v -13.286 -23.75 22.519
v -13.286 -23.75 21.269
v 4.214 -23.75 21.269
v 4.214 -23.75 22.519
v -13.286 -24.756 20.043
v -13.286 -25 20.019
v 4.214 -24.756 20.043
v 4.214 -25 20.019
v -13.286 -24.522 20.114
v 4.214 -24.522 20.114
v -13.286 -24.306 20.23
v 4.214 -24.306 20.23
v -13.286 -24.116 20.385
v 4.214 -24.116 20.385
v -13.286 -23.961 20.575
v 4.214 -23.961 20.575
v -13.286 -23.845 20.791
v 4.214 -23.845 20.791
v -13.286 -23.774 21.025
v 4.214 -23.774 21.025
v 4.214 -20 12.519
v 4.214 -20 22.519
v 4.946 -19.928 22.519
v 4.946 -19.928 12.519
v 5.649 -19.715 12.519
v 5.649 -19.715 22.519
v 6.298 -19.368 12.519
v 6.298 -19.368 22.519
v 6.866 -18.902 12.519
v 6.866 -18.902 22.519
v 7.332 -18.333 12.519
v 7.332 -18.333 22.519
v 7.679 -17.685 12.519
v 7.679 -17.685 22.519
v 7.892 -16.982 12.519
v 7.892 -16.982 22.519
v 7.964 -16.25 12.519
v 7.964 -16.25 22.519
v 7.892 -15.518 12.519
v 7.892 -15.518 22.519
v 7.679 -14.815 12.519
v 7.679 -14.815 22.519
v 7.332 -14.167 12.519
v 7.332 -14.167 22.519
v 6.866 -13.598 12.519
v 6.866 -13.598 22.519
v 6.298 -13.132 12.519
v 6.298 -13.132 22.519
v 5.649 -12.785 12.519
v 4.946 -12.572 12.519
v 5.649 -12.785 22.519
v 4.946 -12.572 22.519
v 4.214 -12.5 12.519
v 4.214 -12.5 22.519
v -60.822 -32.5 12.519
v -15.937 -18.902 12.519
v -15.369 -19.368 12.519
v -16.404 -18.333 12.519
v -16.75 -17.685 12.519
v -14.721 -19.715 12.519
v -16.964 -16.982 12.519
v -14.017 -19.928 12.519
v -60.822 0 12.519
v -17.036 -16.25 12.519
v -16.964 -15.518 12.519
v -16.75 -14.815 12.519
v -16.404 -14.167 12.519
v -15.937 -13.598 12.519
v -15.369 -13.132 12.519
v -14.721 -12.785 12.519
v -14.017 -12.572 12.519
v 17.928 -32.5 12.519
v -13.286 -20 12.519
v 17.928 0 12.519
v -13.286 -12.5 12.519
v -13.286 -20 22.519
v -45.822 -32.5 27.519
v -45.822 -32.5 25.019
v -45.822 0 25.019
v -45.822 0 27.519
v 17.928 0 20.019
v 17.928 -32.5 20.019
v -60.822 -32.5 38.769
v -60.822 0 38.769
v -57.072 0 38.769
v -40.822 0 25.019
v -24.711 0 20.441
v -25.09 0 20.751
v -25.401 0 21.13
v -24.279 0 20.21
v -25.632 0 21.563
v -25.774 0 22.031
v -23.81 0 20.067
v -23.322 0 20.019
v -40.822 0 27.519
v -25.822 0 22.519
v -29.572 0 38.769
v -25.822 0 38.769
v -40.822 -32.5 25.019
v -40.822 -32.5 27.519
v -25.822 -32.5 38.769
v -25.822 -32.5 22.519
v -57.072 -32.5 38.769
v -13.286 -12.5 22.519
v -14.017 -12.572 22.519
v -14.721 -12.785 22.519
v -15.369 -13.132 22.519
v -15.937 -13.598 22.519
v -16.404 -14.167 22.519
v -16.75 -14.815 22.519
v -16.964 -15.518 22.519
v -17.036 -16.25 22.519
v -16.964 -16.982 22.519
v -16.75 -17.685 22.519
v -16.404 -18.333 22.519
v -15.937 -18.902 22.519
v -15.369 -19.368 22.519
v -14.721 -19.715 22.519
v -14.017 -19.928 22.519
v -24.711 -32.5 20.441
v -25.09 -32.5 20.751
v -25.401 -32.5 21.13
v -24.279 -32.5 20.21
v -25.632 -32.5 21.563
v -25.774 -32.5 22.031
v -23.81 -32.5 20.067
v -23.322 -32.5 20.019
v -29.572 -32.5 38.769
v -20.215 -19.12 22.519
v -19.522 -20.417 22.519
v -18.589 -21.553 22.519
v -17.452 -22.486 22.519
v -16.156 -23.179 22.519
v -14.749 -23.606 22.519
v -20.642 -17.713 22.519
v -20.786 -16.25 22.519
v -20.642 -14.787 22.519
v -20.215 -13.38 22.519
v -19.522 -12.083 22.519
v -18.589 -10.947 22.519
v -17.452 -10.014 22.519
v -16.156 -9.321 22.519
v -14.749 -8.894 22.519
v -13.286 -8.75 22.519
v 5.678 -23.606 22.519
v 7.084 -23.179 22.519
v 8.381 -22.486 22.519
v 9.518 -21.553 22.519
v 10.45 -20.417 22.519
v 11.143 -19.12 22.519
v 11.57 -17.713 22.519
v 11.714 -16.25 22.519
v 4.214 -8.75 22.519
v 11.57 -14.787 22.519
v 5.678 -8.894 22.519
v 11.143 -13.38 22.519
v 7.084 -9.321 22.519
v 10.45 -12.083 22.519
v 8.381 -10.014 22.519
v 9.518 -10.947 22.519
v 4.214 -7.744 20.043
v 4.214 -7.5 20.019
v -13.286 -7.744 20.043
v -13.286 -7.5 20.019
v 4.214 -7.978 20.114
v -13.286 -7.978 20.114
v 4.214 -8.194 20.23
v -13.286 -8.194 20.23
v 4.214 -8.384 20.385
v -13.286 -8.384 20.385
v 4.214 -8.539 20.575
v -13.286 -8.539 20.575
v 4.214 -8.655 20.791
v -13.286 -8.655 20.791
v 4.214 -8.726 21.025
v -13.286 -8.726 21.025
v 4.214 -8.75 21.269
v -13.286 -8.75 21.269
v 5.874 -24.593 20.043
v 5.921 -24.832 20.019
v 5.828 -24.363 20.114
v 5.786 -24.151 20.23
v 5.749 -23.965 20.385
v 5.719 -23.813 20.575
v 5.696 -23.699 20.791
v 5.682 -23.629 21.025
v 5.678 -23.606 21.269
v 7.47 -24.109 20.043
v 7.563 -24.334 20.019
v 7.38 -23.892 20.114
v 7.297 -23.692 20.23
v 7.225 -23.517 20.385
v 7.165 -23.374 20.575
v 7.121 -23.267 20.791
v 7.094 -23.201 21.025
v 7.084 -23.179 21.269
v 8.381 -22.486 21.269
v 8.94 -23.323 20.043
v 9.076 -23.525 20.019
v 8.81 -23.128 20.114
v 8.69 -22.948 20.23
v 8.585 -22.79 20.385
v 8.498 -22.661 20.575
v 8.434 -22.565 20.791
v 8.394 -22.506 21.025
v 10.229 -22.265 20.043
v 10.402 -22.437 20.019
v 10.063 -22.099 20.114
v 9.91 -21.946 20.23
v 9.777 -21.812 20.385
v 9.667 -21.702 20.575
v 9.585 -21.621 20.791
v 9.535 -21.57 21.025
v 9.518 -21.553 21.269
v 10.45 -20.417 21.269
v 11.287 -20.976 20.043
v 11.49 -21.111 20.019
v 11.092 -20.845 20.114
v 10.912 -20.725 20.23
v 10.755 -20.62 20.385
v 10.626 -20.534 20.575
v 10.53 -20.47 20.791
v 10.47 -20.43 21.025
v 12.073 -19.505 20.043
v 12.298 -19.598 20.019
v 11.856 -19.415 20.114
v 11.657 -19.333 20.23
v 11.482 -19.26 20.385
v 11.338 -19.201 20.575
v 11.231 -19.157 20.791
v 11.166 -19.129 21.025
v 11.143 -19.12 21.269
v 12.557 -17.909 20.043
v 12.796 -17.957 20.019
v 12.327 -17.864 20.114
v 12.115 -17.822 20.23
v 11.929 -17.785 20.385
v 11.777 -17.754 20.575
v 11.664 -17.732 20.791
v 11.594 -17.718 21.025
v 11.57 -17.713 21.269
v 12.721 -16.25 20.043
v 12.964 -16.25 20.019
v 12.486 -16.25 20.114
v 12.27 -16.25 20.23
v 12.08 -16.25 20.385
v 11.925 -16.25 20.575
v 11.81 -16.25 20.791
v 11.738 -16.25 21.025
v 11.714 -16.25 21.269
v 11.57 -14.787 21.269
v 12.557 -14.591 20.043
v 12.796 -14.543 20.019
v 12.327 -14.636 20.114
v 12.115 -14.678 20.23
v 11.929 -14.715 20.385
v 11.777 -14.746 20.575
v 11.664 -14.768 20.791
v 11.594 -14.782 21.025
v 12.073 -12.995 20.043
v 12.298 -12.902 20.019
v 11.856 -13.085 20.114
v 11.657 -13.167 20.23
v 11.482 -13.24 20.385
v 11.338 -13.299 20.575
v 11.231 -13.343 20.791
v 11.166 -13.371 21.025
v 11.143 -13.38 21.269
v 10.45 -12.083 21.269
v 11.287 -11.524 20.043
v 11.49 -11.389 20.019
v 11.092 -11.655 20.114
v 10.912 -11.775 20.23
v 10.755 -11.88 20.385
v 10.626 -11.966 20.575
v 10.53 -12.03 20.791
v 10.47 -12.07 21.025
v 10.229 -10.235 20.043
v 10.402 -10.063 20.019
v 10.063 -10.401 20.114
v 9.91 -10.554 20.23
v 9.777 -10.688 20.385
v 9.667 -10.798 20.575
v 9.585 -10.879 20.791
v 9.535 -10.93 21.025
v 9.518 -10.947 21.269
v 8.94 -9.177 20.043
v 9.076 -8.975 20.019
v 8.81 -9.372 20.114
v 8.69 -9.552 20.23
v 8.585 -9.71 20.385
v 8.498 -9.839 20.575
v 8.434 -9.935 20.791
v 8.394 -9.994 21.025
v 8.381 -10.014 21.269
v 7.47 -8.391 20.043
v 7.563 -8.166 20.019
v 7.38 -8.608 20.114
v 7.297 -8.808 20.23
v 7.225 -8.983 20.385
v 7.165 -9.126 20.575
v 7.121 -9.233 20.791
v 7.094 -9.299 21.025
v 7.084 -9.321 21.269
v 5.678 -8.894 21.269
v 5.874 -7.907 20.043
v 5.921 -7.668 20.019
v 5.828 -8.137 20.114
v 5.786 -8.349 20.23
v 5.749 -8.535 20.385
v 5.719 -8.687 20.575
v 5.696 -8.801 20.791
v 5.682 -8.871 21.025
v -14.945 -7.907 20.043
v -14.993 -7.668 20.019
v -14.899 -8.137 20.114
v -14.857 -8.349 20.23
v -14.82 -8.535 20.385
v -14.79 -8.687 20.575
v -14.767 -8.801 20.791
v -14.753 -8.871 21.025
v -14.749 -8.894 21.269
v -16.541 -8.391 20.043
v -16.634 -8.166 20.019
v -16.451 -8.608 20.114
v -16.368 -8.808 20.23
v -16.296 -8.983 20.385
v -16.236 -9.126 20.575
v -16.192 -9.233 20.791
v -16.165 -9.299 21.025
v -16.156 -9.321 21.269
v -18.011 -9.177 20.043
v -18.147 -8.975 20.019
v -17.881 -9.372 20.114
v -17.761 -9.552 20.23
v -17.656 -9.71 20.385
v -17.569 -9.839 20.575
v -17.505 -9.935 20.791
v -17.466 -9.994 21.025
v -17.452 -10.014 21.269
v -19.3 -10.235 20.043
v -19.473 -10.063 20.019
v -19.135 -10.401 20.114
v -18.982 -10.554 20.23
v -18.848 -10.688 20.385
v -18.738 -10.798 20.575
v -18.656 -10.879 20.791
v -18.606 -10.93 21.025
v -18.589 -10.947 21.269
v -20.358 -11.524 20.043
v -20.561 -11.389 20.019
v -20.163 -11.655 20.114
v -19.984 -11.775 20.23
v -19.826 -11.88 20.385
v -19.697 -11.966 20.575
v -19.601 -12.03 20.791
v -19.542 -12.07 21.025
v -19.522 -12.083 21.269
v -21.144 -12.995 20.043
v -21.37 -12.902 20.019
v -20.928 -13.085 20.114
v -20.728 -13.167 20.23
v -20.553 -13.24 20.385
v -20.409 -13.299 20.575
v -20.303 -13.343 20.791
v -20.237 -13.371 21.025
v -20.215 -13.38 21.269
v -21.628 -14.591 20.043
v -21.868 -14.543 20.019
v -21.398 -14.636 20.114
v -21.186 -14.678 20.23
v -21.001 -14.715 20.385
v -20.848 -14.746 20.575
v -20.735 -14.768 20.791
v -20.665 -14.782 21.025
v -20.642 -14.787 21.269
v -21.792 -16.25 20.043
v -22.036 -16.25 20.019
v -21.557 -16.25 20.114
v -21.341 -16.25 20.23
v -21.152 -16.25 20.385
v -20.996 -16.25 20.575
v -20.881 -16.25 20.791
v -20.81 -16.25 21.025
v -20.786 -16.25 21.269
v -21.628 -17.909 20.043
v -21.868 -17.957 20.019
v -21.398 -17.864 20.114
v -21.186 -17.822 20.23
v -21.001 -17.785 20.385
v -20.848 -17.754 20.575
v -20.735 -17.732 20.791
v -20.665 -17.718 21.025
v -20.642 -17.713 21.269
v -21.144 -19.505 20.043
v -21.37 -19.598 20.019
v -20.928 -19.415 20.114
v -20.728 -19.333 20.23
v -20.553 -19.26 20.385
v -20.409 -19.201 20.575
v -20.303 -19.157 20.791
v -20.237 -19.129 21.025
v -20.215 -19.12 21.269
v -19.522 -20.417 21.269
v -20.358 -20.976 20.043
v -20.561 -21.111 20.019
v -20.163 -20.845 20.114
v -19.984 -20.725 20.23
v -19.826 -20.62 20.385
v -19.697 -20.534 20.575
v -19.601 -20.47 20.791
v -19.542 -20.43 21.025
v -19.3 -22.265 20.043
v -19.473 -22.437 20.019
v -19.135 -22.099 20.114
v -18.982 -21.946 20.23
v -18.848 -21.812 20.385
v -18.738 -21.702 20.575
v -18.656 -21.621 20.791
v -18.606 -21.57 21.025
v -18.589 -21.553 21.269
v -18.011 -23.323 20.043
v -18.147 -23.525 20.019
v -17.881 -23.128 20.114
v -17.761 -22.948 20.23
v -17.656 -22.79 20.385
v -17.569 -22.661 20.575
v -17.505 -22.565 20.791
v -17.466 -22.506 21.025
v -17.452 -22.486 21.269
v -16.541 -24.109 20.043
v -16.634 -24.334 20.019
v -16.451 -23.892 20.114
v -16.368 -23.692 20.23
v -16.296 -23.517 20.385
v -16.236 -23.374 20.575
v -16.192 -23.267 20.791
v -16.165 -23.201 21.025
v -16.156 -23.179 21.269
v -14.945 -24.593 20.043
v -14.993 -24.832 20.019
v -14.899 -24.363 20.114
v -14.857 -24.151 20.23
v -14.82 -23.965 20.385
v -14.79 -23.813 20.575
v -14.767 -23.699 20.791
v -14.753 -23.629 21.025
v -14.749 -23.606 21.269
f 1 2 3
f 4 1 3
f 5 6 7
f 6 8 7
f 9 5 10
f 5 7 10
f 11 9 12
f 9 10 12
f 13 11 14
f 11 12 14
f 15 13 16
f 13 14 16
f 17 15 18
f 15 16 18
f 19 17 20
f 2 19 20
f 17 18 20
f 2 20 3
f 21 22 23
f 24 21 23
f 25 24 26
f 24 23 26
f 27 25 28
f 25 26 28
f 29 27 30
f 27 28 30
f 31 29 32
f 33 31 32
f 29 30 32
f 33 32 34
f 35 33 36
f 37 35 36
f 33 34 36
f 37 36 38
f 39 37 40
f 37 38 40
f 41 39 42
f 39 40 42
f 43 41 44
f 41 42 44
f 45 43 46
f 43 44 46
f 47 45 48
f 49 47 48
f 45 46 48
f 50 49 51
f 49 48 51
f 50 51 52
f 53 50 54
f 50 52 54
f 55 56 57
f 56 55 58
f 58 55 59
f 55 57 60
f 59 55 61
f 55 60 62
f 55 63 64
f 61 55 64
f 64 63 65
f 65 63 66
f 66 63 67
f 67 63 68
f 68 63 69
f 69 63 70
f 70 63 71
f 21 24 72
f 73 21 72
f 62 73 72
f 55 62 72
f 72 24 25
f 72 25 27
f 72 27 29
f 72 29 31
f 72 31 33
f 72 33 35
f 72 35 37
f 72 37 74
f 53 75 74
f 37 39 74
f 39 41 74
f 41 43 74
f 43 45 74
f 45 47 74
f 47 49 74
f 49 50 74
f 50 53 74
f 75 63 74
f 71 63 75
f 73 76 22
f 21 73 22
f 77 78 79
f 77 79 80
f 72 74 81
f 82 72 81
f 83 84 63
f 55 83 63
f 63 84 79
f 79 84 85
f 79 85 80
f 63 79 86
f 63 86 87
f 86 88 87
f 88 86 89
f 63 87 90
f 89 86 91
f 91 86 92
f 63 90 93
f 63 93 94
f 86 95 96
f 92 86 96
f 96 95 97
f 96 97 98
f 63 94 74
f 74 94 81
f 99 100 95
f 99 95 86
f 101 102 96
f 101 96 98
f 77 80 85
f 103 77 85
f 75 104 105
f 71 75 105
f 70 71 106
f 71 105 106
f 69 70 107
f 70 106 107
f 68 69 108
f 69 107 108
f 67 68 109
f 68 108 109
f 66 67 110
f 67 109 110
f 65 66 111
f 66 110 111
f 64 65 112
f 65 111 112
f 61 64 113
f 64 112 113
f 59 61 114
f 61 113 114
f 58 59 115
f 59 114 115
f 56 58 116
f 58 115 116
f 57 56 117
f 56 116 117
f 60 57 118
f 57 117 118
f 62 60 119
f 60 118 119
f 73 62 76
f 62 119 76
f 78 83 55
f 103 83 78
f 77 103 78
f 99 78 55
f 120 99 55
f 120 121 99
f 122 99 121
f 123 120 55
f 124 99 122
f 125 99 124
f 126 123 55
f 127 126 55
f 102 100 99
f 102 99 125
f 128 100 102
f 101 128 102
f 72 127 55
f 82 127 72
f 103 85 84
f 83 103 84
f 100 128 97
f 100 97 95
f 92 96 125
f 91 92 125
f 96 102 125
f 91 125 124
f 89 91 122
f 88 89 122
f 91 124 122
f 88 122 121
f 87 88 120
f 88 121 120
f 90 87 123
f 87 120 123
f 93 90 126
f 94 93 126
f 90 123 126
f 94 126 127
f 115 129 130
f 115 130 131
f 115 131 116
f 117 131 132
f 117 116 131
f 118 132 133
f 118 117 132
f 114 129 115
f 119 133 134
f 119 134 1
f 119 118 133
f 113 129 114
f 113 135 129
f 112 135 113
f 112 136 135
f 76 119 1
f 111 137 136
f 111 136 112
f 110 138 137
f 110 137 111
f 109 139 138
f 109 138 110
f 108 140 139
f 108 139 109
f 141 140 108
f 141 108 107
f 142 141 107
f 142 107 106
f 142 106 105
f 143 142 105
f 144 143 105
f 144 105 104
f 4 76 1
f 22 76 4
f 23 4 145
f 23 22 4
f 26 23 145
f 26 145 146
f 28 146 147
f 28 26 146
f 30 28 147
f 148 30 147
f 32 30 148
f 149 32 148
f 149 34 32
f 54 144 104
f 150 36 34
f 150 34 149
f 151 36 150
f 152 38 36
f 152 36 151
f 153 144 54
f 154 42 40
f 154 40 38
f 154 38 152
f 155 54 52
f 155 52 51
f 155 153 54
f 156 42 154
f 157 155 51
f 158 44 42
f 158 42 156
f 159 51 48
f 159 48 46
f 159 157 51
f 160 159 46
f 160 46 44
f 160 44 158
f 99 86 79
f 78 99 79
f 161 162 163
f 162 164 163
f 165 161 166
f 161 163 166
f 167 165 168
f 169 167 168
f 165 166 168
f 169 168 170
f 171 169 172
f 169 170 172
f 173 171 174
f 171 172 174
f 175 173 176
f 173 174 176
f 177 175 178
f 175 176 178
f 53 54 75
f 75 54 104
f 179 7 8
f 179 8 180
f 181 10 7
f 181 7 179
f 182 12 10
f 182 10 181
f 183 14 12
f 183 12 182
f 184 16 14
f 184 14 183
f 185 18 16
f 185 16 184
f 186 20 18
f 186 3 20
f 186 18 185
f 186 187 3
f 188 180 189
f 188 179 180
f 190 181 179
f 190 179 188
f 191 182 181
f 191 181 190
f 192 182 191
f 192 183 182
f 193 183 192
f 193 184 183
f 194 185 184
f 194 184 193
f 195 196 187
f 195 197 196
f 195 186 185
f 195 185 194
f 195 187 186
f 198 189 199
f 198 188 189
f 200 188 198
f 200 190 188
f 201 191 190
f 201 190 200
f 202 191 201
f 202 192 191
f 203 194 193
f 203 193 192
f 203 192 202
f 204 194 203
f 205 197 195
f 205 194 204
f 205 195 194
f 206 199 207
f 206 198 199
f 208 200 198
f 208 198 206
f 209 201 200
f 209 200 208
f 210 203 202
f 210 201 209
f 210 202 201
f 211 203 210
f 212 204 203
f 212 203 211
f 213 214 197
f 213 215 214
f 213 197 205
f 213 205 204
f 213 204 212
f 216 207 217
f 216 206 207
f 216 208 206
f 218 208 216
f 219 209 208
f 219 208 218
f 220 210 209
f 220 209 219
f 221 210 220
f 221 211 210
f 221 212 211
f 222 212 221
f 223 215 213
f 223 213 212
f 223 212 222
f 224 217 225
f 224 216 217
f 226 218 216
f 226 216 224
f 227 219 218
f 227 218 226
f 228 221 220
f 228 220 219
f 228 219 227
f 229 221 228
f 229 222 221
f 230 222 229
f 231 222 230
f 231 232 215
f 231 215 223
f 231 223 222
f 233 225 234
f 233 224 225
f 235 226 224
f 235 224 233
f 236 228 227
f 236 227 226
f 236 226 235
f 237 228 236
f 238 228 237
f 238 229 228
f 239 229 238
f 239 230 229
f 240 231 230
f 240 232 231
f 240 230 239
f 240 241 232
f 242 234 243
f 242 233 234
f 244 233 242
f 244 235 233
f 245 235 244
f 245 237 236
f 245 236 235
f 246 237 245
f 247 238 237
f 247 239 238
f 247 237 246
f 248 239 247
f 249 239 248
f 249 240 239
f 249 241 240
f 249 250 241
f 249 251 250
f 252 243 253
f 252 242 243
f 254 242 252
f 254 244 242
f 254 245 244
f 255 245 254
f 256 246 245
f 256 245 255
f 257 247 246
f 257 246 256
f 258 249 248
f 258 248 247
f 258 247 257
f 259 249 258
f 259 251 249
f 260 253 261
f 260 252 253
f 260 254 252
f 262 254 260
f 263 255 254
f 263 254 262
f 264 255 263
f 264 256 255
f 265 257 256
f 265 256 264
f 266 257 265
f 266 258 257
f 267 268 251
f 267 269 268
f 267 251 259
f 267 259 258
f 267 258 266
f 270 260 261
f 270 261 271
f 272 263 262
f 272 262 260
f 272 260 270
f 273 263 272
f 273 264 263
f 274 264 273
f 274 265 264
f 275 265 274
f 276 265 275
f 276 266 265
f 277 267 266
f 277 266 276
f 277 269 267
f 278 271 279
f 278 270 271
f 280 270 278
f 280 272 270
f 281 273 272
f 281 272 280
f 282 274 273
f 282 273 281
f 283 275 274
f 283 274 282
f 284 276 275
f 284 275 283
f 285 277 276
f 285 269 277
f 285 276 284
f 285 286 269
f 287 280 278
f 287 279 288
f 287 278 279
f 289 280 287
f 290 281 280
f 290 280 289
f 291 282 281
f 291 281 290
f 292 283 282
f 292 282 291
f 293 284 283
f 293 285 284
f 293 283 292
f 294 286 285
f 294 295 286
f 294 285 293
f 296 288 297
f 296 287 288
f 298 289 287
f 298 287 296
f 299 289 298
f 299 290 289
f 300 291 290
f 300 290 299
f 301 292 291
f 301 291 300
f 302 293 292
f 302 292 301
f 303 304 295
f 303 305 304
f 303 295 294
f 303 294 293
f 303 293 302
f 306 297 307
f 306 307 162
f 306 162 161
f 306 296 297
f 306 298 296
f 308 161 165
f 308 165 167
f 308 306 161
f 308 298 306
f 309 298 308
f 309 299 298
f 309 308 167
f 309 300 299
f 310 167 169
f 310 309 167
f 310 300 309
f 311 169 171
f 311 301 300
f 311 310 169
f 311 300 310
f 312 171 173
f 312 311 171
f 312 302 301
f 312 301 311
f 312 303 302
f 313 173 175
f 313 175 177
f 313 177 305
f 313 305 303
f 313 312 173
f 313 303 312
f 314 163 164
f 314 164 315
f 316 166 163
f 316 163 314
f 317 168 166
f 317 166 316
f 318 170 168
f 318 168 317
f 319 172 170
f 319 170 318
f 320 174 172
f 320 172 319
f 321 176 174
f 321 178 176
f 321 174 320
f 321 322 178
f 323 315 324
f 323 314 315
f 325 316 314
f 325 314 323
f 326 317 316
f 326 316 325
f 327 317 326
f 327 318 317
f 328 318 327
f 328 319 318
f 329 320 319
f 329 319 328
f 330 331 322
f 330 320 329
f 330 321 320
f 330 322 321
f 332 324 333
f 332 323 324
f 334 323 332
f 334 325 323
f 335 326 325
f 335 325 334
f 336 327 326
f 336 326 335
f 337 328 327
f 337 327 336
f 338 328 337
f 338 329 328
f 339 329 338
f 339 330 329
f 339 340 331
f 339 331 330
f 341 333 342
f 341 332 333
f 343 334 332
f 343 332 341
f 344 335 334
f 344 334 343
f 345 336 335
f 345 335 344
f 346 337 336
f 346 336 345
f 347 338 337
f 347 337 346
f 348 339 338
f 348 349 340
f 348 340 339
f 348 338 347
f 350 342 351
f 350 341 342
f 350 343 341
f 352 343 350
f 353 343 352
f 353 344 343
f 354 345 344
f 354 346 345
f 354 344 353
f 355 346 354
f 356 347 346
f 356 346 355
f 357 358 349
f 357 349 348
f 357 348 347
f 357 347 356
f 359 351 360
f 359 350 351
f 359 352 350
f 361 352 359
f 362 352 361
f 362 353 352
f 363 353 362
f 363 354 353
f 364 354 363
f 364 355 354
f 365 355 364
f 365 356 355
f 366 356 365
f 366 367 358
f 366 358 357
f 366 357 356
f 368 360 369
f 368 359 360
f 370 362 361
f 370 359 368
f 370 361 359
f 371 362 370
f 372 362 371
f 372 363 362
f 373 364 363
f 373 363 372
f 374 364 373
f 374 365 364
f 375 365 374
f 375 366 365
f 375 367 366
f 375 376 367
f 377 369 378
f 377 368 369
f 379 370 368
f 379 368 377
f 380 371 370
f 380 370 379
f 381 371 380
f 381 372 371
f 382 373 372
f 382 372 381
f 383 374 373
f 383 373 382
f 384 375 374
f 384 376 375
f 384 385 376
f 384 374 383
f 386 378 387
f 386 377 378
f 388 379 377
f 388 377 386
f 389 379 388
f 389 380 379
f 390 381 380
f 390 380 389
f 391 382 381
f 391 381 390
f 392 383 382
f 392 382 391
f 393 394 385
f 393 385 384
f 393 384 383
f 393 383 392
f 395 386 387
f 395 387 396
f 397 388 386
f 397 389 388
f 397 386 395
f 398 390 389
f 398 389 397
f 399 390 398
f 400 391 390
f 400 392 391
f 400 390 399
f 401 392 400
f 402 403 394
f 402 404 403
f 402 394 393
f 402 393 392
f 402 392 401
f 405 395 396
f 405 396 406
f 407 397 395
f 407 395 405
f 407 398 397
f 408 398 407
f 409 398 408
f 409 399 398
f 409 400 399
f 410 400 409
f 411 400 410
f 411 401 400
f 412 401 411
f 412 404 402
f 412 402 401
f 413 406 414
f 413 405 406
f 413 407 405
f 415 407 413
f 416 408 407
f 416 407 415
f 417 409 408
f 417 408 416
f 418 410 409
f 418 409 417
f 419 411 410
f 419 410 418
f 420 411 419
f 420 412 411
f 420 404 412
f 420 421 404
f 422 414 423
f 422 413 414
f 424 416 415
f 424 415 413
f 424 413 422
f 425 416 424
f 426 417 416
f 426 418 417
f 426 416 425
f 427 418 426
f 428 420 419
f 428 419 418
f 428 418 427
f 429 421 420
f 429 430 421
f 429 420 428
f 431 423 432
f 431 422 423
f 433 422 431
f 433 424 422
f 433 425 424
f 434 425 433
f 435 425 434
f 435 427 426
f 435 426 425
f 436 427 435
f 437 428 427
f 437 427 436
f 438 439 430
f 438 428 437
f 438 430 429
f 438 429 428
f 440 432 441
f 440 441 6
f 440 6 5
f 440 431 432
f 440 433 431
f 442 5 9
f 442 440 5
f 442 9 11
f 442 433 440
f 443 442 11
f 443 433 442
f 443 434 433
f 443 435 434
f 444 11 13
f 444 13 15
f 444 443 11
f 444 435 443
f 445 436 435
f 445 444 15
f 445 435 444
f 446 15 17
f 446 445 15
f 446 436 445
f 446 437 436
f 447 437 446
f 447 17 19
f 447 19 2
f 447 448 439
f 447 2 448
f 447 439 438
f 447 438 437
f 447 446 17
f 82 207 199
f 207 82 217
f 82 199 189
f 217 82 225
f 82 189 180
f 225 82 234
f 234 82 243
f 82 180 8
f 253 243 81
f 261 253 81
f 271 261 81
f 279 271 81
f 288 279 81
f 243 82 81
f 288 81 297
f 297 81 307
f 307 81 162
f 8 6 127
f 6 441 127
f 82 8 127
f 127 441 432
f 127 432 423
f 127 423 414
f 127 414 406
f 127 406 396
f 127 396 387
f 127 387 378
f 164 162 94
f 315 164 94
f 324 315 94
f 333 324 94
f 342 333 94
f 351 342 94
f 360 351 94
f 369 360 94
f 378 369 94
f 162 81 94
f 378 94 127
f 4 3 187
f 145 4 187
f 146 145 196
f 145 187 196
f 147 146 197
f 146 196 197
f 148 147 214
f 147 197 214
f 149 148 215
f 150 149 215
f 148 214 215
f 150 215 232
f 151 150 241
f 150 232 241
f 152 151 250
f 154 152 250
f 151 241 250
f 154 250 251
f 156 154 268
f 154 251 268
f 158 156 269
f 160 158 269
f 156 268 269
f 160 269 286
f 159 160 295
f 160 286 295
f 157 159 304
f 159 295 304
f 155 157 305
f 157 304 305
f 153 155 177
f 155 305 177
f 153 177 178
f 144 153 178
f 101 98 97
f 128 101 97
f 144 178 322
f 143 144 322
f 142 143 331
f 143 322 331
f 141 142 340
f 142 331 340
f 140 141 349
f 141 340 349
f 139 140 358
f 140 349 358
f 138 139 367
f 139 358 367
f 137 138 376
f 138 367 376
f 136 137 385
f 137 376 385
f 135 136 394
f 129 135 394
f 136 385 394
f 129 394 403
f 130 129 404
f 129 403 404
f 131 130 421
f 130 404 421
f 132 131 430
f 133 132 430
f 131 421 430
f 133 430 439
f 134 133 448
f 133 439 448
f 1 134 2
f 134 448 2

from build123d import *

# Parameters (mm, degrees)
F1_DEPTH = 32.5
F3_DEPTH = 2.5
F4_DEPTH = 25
F5_R     = 2.5
F6_R     = 1.25


with BuildPart() as f1:
    # F0 (on Front) → F1 (new body)
    with BuildSketch(Plane.XZ):
        Polygon((-57.07207, 38.769209), (-60.82207, 38.769209), (-60.82207, 12.519209), (17.92793, 12.519209), (17.92793, 20.019209), (-25.82207, 20.019209), (-25.82207, 38.769209), (-29.57207, 38.769209), (-40.82207, 27.519209), (-40.82207, 25.019209), (-45.82207, 25.019209), (-45.82207, 27.519209), align=None)
    extrude(amount=F1_DEPTH)

    # F2 (on face) → F3 (join)
    with BuildSketch(Plane.XY.offset(20.019209)):
        with BuildLine():
            Line((4.214367, -8.75), (-13.285633, -8.75))
            ThreePointArc((-13.285633, -8.75), (-20.785633, -16.25), (-13.285633, -23.75))
            Line((-13.285633, -23.75), (4.214367, -23.75))
            ThreePointArc((4.214367, -23.75), (11.714367, -16.25), (4.214367, -8.75))
        make_face()
        with BuildLine():
            ThreePointArc((-13.285633, -20), (-17.035633, -16.25), (-13.285633, -12.5))
            Line((-13.285633, -12.5), (4.214367, -12.5))
            ThreePointArc((4.214367, -12.5), (7.964367, -16.25), (4.214367, -20))
            Line((4.214367, -20), (-13.285633, -20))
        make_face(mode=Mode.SUBTRACT)
    extrude(amount=F3_DEPTH)

    # F3_face (on face) → F4 (cut)
    with BuildSketch(Plane(origin=(-4.535633, -16.25, 20.019209), x_dir=(1, 0, 0), z_dir=(0, 0, 1))):
        with BuildLine():
            Line((8.75, 3.75), (-8.75, 3.75))
            ThreePointArc((-8.75, 3.75), (-12.5, 0), (-8.75, -3.75))
            Line((-8.75, -3.75), (8.75, -3.75))
            ThreePointArc((8.75, -3.75), (12.5, 0), (8.75, 3.75))
        make_face()
    extrude(amount=-F4_DEPTH, mode=Mode.SUBTRACT)

    # F5
    f5_edges = [f1.edges().sort_by_distance(p)[0] for p in [
        (-25.82207, -16.25, 20.019209),
    ]]
    fillet(f5_edges, radius=F5_R)

    # F6
    f6_edges = [f1.edges().sort_by_distance(p)[0] for p in [
        (-4.535633, -23.75, 20.019209),
    ]]
    fillet(f6_edges, radius=F6_R)


solid = f1.part
